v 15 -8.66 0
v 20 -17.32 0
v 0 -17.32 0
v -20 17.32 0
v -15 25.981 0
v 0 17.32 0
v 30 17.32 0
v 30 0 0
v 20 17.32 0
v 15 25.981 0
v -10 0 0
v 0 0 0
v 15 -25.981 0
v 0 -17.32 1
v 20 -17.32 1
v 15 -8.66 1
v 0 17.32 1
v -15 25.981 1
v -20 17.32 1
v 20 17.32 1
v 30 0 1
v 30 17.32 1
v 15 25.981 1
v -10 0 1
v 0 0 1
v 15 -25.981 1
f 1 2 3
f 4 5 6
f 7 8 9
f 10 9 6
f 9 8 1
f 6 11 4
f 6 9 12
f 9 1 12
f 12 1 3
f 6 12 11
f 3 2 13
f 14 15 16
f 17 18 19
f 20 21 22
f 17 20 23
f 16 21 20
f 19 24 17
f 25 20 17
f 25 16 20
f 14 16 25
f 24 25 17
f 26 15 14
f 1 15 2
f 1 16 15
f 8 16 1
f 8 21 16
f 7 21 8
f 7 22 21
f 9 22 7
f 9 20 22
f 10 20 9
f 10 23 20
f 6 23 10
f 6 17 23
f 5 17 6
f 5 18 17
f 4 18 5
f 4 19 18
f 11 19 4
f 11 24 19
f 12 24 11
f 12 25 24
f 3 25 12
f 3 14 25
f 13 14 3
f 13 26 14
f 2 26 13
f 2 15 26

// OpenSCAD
r3 = sqrt(3);
// geometry for 'the hat' monotile:
edges = [
    [r3, -90],
    [r3, -30],
    [1, 60],
    [1, 120],
    [r3, 30],
    [r3, 90],
    [1, 180],
    [1, 120],
    [r3, -150],
    [r3, 150],
    [1, -120],
    [2, -60],
    [1, 0]
];

// translate the lengths and angles into vectors:
vectors = [
    for (i = [0:len(edges)-1]) 
    let(
        vert = [edges[i][0]*cos(edges[i][1]), edges[i][0]*sin(edges[i][1])]
    )
    vert
];

function vert(i=0) = (i < 1) ? vectors[0] : vert(i-1) + vectors[i];


verts = [for (i = [0:len(edges)-1]) vert(i)];

echo(verts);

height = 1;

length_scale = 10;
scale([length_scale, length_scale, 1])
linear_extrude(height)
polygon(verts);
